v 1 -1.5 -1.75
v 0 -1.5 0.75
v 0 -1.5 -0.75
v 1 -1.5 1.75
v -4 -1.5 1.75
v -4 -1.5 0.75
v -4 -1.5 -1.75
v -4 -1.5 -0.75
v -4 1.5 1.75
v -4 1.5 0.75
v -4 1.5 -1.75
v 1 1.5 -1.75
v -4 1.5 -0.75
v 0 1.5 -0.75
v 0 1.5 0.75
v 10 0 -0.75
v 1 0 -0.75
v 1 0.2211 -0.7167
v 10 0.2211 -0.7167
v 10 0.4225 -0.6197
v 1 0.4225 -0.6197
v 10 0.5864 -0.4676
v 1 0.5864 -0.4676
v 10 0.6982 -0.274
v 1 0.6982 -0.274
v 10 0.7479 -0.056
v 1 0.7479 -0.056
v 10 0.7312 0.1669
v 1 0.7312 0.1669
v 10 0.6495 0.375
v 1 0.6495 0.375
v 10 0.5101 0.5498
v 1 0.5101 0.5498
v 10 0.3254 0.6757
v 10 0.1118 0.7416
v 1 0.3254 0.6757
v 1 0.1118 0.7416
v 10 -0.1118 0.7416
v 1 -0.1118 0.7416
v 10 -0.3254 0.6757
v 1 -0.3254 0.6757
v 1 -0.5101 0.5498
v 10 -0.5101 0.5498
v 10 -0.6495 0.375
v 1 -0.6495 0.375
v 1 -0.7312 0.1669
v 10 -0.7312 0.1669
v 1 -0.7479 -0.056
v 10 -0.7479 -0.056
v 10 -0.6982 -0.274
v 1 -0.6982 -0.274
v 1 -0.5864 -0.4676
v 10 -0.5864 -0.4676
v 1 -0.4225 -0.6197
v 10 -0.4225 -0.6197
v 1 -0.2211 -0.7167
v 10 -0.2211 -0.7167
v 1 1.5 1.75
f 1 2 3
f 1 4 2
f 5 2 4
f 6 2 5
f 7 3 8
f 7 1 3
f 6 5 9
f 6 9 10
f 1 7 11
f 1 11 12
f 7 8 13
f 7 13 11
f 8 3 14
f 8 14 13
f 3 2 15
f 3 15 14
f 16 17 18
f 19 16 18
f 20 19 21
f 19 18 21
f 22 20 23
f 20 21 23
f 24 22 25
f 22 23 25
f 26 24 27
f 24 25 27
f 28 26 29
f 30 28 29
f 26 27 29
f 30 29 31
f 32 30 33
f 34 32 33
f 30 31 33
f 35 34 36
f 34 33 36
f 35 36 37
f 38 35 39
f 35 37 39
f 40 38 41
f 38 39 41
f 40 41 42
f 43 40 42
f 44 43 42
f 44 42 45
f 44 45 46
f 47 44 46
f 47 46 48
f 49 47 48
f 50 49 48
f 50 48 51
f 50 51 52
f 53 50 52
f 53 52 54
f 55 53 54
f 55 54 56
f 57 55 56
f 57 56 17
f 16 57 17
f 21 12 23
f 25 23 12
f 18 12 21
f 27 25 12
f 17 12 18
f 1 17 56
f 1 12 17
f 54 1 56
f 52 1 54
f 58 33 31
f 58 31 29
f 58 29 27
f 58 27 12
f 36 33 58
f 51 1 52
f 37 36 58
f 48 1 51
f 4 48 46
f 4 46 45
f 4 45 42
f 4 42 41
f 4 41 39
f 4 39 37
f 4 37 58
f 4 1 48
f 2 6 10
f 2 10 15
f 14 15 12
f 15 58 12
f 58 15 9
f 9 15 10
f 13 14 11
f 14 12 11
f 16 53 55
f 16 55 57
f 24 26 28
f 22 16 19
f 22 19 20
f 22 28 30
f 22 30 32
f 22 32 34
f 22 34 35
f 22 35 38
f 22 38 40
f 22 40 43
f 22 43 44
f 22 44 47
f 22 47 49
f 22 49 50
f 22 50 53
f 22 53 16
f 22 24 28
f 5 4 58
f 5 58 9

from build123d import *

# Parameters (mm, degrees)
SKETCH1_R                = 0.75
BOSS_EXTRUDE1_DEPTH      = 10
BOSS_EXTRUDE2_DEPTH      = 1.5
BOSS_EXTRUDE2_DEPTH_BACK = 1.5


with BuildPart() as part:
    # Sketch1 → Boss-Extrude1 (new body)
    with BuildSketch(Plane(origin=(0, 0, 0), x_dir=(0, 0, -1), z_dir=(1, 0, 0))):
        Circle(SKETCH1_R)
    extrude(amount=BOSS_EXTRUDE1_DEPTH)

    # Sketch2 → Boss-Extrude2 (add, two sides: drawn at the far end of the back side and taken through both)
    with BuildSketch(Plane(origin=(0, 0, 0), x_dir=(1, 0, 0), z_dir=(0, 1, 0)).offset(-BOSS_EXTRUDE2_DEPTH_BACK)):
        Polygon((1, 1.75), (1, -1.75), (-4, -1.75), (-4, -0.75), (0, -0.75), (0, 0.75), (-4, 0.75), (-4, 1.75), align=None)
    extrude(amount=BOSS_EXTRUDE2_DEPTH + BOSS_EXTRUDE2_DEPTH_BACK)


solid = part.part
